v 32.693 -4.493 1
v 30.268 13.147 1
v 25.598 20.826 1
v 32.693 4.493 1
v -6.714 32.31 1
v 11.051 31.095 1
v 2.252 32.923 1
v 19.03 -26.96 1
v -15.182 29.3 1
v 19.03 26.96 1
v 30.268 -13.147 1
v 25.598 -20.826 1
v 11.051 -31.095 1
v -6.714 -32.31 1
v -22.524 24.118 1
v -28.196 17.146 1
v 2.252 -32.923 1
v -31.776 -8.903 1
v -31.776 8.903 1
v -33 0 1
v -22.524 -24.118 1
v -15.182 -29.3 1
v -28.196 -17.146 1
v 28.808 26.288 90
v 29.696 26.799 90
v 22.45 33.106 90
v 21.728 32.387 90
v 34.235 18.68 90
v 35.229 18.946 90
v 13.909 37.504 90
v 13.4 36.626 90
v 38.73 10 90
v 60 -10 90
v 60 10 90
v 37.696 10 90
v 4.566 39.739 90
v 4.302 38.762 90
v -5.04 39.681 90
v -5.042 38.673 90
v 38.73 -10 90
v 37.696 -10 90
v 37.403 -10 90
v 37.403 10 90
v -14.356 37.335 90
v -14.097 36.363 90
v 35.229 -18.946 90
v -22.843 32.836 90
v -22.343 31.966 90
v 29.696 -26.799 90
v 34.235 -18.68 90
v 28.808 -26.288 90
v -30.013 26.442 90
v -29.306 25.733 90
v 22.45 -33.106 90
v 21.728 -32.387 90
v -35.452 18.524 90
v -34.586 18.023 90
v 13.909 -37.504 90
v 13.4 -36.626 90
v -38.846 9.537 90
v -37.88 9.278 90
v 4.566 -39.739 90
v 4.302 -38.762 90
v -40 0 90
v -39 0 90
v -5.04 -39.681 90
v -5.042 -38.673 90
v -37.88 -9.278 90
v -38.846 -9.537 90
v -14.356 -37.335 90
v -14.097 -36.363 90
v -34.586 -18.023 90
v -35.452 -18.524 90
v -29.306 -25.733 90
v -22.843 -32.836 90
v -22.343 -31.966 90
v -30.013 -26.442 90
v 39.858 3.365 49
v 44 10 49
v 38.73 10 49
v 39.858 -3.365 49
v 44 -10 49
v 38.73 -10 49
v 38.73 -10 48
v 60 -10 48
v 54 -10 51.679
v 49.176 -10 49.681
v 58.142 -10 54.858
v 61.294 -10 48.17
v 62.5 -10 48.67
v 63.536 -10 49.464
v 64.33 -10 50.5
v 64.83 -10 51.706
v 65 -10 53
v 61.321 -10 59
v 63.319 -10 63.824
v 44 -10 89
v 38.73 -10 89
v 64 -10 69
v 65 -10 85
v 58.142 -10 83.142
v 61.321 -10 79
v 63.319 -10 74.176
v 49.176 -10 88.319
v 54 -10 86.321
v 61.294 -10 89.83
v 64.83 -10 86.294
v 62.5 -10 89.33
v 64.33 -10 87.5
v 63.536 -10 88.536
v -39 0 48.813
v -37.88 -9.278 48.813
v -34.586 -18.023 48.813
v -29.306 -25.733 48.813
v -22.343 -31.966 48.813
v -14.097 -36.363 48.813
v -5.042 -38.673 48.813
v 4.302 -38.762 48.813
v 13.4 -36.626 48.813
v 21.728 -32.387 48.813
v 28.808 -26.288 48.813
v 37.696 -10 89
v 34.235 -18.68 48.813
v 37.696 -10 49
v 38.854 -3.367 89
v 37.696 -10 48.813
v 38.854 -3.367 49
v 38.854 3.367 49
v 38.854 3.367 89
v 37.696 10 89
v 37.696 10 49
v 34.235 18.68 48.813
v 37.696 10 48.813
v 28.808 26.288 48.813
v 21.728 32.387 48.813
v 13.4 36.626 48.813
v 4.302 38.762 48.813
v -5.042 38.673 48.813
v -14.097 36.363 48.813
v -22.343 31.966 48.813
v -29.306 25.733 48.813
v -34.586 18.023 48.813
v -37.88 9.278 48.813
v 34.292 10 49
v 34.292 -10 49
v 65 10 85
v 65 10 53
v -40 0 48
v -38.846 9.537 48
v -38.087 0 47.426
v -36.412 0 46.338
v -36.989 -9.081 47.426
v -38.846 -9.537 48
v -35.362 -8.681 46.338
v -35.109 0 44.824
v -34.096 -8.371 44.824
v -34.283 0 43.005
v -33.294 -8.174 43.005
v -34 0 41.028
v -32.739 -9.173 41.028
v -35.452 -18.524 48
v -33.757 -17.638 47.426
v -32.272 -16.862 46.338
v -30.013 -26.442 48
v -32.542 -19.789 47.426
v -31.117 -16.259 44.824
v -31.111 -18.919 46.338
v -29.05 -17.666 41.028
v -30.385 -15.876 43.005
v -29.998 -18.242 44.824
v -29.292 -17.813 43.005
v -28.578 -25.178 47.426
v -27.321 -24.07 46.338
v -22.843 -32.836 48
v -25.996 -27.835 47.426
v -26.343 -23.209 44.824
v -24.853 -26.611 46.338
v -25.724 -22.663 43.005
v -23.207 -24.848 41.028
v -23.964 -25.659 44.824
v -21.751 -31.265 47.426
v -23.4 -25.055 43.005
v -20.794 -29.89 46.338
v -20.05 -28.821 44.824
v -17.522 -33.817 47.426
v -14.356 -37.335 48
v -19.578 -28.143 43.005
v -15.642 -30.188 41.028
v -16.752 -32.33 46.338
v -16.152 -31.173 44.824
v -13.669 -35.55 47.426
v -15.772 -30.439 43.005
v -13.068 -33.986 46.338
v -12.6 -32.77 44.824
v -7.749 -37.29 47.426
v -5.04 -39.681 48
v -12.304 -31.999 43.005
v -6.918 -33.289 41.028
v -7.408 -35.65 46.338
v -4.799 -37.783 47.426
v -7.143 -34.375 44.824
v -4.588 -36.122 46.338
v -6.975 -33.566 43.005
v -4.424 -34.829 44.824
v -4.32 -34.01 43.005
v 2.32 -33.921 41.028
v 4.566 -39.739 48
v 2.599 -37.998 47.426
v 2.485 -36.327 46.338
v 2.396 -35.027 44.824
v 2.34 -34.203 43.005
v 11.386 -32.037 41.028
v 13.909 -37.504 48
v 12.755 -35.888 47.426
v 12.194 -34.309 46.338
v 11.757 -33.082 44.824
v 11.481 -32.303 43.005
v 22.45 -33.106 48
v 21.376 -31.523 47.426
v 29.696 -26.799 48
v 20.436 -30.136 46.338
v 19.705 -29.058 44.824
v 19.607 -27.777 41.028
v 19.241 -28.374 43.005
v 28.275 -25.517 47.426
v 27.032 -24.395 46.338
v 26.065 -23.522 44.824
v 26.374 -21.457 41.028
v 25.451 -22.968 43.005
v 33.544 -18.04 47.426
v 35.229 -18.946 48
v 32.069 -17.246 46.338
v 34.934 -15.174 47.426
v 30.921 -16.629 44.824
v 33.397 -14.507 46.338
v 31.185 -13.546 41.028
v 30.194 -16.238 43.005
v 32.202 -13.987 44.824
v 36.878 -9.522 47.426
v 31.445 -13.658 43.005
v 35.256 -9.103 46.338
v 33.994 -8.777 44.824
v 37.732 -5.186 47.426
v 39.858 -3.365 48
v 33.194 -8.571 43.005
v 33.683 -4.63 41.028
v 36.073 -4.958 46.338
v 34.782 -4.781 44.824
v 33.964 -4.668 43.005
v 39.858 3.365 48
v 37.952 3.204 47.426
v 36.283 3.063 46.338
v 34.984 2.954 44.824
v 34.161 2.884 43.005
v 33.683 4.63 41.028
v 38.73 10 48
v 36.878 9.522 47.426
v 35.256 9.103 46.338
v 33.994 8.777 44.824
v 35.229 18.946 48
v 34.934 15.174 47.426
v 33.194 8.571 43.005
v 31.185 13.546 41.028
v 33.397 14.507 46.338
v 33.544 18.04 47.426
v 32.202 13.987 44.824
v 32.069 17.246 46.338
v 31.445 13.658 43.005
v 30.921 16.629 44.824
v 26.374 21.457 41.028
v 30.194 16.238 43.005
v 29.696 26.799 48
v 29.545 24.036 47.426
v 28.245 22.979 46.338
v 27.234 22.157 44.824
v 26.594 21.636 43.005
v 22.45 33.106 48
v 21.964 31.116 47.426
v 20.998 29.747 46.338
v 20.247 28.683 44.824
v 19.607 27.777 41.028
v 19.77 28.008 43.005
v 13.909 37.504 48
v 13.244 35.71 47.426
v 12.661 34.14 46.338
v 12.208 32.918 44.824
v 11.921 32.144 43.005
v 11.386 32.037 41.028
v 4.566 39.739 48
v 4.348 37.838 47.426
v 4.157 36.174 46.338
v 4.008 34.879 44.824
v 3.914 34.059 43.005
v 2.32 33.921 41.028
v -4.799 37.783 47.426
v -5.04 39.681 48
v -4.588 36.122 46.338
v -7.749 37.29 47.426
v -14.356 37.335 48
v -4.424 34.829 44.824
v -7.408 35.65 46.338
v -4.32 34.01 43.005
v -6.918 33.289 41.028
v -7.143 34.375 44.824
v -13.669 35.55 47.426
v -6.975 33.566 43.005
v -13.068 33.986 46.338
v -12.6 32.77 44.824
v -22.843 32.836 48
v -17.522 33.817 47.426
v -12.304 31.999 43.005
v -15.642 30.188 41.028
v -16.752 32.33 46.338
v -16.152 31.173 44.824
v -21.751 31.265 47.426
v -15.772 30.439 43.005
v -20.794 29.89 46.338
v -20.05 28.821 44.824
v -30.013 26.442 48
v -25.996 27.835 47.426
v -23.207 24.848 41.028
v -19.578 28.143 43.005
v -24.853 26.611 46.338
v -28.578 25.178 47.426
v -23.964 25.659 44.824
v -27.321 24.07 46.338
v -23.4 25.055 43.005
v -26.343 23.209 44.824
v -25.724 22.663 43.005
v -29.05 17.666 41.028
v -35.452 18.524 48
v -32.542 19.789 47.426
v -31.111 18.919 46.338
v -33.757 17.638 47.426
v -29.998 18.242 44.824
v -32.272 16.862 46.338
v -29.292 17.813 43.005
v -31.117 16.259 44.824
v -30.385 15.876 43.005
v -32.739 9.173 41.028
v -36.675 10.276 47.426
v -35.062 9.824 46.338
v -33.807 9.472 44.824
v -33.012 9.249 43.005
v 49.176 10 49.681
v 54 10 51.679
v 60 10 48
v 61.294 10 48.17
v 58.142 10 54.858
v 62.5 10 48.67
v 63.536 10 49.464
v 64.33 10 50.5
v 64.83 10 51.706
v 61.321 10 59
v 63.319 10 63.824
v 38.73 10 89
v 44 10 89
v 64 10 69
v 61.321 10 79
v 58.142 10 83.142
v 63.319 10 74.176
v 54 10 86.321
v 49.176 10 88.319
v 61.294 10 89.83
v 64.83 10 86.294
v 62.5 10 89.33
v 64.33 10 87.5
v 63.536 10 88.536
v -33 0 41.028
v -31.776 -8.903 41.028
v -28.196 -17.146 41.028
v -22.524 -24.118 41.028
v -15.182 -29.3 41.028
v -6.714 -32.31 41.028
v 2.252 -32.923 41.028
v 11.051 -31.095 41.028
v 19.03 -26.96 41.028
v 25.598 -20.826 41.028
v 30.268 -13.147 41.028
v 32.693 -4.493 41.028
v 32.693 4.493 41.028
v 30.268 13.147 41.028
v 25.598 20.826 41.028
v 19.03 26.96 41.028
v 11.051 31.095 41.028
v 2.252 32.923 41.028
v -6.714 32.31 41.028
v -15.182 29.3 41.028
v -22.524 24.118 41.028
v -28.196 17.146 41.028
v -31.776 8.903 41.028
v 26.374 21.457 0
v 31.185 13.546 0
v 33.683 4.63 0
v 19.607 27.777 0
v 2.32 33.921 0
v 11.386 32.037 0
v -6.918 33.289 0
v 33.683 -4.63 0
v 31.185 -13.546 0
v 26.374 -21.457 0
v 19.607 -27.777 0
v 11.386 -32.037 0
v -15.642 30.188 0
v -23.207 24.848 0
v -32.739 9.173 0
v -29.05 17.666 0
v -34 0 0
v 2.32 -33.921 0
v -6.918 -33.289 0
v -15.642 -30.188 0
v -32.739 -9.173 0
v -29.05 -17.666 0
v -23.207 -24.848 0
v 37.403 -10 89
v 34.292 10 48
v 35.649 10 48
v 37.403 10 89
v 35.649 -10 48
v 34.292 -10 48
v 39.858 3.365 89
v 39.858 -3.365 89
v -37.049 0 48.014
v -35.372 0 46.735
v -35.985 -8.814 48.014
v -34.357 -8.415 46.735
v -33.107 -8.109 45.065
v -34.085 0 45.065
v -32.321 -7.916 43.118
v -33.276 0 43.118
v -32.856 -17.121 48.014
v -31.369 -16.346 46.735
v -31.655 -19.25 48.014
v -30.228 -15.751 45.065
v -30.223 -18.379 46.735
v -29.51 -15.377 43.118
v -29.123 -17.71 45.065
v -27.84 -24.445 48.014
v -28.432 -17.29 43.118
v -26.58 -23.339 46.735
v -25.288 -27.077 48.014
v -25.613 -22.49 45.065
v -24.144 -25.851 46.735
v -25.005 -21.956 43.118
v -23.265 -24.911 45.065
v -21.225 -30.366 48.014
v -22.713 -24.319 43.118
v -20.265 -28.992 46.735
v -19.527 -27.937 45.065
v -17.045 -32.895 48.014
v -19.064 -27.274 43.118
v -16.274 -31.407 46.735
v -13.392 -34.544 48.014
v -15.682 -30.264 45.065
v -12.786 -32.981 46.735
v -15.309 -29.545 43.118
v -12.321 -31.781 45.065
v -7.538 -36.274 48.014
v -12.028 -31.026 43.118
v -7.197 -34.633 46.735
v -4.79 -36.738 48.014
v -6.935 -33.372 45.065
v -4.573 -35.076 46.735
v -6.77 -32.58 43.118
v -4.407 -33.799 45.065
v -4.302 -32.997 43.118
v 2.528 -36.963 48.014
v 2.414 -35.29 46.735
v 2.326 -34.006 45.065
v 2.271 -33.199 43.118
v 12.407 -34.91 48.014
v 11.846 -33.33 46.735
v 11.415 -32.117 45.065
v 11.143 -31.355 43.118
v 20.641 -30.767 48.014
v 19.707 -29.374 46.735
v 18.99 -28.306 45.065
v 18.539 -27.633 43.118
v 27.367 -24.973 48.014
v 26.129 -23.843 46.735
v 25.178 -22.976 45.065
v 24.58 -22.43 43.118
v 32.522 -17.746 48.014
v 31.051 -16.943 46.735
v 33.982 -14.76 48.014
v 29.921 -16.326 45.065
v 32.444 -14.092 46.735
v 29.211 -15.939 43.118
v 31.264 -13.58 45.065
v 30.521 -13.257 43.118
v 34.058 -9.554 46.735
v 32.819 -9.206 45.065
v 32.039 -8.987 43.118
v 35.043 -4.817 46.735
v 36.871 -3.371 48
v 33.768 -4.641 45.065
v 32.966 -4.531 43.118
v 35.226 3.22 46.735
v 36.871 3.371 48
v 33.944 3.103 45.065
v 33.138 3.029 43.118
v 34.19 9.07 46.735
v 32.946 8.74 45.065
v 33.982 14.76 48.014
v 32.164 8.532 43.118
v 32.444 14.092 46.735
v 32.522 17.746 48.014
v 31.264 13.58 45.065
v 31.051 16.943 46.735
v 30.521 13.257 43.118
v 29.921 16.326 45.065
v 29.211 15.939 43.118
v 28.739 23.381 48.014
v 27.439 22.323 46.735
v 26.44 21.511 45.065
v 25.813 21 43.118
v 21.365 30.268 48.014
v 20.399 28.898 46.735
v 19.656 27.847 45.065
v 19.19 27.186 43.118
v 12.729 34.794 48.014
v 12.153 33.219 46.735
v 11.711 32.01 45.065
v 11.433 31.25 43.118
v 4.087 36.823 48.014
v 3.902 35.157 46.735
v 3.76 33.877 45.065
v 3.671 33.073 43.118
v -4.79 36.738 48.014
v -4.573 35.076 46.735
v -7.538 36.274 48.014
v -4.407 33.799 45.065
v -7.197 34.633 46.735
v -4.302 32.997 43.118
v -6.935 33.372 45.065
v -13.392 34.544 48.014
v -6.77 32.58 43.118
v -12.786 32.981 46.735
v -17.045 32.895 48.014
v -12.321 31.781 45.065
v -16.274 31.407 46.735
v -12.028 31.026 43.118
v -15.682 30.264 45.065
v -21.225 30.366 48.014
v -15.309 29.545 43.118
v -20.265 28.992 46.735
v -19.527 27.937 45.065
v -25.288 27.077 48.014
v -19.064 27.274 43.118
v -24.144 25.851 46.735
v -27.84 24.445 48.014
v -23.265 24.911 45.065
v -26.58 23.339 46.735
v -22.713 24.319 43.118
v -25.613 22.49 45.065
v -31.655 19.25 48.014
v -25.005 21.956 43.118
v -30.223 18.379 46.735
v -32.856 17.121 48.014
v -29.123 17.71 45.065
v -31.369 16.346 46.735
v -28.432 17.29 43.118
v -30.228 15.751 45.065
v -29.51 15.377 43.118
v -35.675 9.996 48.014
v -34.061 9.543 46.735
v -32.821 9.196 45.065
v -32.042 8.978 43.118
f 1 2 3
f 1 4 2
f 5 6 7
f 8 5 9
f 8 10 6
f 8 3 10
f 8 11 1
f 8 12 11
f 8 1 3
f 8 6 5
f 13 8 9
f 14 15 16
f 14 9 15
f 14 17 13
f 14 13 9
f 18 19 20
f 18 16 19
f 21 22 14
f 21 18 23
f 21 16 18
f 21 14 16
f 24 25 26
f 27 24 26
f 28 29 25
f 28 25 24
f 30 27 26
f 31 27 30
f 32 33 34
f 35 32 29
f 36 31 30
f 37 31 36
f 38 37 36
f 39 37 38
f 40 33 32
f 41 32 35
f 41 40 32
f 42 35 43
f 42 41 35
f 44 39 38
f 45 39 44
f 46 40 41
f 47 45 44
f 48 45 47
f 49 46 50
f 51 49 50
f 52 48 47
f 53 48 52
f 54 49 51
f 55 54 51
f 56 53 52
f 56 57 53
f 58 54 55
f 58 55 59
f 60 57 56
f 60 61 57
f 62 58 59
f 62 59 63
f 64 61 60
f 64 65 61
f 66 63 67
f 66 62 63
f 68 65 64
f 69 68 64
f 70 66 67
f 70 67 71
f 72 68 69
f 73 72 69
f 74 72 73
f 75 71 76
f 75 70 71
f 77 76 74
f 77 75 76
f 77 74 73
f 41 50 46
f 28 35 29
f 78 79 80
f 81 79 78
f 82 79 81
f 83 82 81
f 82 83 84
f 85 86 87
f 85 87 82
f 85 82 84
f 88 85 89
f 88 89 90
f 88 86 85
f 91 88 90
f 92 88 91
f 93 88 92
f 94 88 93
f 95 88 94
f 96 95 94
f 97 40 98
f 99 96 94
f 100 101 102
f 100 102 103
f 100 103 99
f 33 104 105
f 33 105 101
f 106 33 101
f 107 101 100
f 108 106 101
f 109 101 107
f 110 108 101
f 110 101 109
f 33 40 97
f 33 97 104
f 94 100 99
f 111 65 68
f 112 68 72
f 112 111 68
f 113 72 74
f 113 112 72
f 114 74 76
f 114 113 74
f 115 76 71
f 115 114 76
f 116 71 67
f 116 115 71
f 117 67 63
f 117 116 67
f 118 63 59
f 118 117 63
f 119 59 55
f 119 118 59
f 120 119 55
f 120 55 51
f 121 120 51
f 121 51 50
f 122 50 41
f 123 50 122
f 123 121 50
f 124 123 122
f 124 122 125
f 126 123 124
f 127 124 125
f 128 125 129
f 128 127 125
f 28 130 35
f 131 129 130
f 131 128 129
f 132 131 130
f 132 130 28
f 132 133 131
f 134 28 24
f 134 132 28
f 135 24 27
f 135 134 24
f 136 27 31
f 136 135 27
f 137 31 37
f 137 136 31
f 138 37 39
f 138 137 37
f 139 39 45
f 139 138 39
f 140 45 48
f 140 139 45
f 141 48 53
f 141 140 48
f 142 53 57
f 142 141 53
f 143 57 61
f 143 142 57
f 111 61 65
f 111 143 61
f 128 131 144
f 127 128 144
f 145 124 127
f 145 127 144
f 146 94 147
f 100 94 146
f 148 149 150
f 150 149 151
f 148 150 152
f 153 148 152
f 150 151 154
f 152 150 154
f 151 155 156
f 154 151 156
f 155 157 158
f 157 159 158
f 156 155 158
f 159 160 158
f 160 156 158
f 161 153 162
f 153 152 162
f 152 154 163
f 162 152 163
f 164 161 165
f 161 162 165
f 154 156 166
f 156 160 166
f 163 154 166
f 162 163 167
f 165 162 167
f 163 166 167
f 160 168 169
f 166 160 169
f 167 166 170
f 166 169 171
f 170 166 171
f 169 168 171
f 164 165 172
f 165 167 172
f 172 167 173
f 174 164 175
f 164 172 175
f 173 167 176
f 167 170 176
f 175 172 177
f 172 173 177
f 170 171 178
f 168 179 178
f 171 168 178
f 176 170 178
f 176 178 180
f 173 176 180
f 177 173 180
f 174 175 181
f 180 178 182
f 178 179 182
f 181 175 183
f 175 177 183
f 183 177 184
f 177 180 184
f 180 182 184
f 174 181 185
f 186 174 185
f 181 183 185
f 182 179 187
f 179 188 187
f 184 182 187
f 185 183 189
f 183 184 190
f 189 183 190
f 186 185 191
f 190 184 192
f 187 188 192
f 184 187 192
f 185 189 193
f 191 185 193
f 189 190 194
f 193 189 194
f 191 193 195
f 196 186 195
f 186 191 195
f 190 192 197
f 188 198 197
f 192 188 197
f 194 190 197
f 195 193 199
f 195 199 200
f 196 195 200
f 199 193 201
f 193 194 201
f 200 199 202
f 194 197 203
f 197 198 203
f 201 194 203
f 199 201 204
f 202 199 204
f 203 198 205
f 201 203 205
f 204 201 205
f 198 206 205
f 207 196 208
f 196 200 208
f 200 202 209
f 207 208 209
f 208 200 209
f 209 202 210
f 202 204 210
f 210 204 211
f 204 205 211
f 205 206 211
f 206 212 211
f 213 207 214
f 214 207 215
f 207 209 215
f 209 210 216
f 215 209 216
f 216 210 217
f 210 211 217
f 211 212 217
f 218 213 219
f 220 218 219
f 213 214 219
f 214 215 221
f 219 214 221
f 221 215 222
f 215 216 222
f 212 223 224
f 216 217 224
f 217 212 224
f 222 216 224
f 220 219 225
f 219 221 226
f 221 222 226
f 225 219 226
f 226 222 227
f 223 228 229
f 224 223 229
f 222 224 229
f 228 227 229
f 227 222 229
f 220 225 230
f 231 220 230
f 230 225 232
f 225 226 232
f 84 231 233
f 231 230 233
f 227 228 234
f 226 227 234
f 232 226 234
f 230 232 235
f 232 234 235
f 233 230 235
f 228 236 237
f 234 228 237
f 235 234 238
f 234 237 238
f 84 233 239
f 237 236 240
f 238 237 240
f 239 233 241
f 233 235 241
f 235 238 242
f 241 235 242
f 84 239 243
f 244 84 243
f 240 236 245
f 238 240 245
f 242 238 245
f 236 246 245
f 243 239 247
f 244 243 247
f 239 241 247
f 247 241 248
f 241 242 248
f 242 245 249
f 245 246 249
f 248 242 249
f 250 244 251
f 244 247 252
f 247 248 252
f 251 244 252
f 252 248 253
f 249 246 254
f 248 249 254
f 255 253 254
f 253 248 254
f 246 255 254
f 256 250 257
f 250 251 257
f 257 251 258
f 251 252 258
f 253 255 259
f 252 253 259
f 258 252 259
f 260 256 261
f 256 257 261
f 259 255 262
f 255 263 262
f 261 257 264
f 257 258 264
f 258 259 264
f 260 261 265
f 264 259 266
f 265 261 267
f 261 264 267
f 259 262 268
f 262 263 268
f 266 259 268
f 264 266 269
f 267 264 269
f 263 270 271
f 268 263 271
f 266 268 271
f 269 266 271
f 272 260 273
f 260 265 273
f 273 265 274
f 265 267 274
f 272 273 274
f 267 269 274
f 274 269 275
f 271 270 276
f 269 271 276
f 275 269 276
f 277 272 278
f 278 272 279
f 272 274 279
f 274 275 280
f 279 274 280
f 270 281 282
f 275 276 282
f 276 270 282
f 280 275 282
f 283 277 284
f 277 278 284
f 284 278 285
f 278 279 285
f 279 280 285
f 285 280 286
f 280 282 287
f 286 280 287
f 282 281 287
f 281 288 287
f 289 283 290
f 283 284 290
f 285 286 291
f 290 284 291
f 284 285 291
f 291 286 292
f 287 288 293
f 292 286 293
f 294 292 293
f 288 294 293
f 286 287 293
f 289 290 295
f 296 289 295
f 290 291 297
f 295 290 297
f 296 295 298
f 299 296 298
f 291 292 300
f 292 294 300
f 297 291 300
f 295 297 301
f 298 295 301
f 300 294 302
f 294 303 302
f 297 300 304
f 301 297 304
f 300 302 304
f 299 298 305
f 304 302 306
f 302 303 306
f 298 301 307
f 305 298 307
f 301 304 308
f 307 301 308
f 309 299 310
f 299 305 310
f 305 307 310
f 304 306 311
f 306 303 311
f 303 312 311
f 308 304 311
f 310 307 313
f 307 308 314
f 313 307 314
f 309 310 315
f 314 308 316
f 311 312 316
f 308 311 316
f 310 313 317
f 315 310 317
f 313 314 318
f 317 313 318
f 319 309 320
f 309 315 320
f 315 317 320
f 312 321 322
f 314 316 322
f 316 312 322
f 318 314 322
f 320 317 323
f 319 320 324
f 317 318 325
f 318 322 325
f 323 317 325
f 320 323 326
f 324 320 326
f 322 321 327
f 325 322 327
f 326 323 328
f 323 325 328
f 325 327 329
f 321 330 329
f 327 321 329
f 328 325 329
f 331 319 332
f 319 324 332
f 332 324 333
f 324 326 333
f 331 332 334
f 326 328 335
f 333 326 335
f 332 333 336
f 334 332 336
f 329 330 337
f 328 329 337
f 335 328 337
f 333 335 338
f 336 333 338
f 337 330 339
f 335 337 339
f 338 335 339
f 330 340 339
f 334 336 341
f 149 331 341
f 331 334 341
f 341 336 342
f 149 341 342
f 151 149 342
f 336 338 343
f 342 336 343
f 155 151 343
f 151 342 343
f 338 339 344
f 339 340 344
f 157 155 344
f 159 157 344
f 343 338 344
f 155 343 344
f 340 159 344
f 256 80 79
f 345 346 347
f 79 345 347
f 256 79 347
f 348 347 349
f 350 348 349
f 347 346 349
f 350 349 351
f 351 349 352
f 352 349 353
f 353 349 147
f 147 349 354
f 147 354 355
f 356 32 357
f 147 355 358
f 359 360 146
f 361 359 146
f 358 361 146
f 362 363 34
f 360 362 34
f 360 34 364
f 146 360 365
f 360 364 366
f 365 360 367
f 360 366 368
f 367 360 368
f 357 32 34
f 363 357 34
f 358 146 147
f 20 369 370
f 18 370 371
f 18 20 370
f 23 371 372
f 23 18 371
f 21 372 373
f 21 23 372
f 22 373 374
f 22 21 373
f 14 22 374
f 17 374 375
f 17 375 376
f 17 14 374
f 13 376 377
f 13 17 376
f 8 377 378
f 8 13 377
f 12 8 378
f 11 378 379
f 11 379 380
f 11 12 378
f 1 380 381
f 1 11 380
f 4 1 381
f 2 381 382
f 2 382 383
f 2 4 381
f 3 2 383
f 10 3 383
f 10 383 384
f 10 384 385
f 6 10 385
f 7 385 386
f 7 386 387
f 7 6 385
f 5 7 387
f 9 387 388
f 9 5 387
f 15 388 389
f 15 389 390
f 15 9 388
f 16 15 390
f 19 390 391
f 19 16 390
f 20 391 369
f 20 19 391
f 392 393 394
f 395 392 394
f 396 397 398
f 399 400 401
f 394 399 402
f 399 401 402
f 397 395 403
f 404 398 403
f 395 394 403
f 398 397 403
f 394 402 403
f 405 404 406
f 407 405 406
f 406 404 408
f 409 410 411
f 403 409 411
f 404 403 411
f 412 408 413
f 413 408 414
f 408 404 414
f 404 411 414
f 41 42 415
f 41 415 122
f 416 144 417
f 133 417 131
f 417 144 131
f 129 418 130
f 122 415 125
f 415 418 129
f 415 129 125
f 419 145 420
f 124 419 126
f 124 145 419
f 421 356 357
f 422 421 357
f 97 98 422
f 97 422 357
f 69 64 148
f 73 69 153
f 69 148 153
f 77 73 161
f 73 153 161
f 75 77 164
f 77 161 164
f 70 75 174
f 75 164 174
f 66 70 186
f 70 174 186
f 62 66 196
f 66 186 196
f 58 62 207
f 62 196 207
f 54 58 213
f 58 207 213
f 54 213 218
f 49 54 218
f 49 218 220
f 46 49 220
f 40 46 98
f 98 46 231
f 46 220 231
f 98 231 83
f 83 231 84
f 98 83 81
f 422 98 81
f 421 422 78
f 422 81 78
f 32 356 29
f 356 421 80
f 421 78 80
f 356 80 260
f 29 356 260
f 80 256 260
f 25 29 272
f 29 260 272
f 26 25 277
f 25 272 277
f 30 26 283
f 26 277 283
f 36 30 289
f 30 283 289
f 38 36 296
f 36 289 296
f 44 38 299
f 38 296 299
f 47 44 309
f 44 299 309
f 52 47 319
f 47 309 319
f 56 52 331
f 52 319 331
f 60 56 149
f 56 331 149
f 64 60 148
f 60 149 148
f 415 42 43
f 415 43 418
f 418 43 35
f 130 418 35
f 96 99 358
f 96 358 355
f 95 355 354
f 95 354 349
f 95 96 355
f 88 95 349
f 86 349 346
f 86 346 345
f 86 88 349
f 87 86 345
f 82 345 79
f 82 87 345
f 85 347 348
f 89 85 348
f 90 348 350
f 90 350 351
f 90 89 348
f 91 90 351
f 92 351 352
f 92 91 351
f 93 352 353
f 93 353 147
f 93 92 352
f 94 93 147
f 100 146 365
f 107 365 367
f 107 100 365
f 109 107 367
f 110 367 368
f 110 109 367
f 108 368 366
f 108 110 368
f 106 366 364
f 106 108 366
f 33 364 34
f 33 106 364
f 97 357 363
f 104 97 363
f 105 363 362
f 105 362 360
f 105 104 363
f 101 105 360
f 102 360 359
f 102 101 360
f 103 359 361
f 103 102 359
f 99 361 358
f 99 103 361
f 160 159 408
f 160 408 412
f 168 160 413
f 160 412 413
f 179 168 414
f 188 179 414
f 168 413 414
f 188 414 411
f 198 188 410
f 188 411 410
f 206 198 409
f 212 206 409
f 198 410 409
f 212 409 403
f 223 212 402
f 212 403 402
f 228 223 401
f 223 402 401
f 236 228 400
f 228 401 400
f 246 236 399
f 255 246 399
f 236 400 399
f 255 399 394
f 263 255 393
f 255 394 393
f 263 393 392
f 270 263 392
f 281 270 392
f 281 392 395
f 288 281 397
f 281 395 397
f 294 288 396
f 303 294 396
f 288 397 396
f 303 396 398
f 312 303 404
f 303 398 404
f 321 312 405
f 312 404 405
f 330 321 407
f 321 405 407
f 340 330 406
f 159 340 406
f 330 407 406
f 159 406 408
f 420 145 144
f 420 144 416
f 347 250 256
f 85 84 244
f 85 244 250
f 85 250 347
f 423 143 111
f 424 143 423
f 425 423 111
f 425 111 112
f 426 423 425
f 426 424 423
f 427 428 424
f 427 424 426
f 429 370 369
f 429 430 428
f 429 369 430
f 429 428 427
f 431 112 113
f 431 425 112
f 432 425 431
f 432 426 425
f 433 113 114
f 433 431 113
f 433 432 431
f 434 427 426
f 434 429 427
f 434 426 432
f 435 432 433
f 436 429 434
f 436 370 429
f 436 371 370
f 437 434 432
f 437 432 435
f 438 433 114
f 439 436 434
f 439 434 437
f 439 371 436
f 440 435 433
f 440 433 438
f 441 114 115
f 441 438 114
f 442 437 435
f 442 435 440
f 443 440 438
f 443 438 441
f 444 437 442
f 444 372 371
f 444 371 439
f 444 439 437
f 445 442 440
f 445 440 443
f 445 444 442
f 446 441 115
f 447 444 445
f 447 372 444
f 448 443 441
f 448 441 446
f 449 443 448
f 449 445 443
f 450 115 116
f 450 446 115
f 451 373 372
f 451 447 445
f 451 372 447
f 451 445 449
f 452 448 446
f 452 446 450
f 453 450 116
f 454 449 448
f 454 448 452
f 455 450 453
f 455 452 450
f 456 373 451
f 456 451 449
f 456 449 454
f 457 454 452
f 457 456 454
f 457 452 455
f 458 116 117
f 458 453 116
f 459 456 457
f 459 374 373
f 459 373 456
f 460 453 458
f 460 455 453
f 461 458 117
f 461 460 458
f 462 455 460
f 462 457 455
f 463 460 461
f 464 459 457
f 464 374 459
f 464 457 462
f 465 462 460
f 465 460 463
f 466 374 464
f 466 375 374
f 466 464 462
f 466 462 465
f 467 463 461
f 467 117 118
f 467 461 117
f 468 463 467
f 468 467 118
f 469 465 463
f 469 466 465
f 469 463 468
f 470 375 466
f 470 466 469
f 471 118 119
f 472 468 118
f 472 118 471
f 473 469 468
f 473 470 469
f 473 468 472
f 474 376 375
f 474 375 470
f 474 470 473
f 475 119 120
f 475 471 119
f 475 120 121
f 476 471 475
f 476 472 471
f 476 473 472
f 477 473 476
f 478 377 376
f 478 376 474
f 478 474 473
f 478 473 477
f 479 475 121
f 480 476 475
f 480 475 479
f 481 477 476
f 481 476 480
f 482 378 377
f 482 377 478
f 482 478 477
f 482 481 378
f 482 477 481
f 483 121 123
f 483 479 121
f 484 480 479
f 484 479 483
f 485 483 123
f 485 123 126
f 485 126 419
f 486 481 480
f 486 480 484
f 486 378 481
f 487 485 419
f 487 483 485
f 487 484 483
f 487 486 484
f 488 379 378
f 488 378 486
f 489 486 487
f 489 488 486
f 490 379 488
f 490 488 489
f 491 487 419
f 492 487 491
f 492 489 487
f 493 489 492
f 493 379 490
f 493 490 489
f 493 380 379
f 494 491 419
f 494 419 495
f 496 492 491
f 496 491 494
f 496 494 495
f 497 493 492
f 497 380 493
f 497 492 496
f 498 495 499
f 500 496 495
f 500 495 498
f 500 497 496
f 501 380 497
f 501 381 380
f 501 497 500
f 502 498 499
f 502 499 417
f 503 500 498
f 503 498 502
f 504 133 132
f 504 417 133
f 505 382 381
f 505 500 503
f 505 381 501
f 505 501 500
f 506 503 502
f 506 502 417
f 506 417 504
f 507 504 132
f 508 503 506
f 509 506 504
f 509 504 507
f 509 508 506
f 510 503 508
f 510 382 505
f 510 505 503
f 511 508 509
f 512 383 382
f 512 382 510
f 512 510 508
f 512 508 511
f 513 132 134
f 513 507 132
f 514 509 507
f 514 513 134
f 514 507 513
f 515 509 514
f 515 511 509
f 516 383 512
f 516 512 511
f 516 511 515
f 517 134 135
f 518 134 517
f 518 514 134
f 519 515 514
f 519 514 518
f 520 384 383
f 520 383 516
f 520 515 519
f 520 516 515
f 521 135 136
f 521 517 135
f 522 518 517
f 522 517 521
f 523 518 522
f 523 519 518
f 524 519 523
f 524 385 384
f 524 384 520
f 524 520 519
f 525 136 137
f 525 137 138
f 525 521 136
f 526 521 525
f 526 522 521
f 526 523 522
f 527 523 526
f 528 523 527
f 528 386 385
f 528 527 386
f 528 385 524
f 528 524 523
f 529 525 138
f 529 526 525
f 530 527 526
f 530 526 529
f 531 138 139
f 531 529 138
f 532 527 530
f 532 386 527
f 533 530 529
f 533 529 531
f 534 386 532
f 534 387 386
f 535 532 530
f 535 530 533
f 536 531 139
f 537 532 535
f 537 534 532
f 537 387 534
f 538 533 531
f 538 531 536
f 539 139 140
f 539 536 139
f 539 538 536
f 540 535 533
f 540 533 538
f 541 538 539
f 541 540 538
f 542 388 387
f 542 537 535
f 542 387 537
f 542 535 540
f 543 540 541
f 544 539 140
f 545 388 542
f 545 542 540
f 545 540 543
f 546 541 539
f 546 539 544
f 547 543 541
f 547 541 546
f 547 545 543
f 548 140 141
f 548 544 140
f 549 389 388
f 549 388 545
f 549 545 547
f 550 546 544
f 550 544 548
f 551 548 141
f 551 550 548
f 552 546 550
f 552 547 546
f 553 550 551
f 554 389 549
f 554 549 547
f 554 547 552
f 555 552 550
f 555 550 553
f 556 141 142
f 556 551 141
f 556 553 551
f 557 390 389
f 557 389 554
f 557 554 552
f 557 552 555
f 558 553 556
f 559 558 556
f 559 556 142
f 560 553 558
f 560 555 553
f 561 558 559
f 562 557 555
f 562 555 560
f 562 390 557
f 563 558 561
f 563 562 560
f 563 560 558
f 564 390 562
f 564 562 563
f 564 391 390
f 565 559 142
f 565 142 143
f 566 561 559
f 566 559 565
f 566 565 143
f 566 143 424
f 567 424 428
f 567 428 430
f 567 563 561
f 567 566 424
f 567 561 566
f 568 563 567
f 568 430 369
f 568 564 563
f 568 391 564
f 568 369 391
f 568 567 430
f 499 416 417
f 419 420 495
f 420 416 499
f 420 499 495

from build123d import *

# Parameters (mm, degrees)
F2_T     = -1
F4_DEPTH = 10


with BuildPart() as f1:
    # F0 (on Front) → F1 (revolve)
    with BuildSketch(Plane.XZ):
        with BuildLine():
            Line((-34, 0), (0, 0))
            Line((0, 0), (0, 90))
            Line((0, 90), (-40, 90))
            Line((-40, 90), (-40, 48))
            ThreePointArc((-40, 48), (-35.706514, 45.627105), (-34, 41.027925))
            Line((-34, 41.027925), (-34, 0))
        make_face()
    revolve(axis=Axis((0, 0, 45), (0, 0, 1)))

    # F2
    f2_openings = [f1.faces().sort_by_distance(p)[0] for p in [
        (0, 0, 90),
    ]]
    offset(amount=F2_T, openings=f2_openings)

    # F3 (on Front) → F4 (join, symmetric)
    with BuildSketch(Plane.XZ):
        with BuildLine():
            Line((60, 90), (37.403014, 90))
            Line((37.403014, 90), (37.403014, 89))
            Line((37.403014, 89), (44, 89))
            ThreePointArc((44, 89), (58.142136, 83.142136), (64, 69))
            ThreePointArc((64, 69), (58.142136, 54.857864), (44, 49))
            Line((44, 49), (34.291856, 49))
            Line((34.291856, 49), (34.291856, 48))
            Line((34.291856, 48), (60, 48))
            ThreePointArc((60, 48), (63.535534, 49.464466), (65, 53))
            Line((65, 53), (65, 85))
            ThreePointArc((65, 85), (63.535534, 88.535534), (60, 90))
        make_face()
    extrude(amount=F4_DEPTH, both=True)


solid = f1.part
